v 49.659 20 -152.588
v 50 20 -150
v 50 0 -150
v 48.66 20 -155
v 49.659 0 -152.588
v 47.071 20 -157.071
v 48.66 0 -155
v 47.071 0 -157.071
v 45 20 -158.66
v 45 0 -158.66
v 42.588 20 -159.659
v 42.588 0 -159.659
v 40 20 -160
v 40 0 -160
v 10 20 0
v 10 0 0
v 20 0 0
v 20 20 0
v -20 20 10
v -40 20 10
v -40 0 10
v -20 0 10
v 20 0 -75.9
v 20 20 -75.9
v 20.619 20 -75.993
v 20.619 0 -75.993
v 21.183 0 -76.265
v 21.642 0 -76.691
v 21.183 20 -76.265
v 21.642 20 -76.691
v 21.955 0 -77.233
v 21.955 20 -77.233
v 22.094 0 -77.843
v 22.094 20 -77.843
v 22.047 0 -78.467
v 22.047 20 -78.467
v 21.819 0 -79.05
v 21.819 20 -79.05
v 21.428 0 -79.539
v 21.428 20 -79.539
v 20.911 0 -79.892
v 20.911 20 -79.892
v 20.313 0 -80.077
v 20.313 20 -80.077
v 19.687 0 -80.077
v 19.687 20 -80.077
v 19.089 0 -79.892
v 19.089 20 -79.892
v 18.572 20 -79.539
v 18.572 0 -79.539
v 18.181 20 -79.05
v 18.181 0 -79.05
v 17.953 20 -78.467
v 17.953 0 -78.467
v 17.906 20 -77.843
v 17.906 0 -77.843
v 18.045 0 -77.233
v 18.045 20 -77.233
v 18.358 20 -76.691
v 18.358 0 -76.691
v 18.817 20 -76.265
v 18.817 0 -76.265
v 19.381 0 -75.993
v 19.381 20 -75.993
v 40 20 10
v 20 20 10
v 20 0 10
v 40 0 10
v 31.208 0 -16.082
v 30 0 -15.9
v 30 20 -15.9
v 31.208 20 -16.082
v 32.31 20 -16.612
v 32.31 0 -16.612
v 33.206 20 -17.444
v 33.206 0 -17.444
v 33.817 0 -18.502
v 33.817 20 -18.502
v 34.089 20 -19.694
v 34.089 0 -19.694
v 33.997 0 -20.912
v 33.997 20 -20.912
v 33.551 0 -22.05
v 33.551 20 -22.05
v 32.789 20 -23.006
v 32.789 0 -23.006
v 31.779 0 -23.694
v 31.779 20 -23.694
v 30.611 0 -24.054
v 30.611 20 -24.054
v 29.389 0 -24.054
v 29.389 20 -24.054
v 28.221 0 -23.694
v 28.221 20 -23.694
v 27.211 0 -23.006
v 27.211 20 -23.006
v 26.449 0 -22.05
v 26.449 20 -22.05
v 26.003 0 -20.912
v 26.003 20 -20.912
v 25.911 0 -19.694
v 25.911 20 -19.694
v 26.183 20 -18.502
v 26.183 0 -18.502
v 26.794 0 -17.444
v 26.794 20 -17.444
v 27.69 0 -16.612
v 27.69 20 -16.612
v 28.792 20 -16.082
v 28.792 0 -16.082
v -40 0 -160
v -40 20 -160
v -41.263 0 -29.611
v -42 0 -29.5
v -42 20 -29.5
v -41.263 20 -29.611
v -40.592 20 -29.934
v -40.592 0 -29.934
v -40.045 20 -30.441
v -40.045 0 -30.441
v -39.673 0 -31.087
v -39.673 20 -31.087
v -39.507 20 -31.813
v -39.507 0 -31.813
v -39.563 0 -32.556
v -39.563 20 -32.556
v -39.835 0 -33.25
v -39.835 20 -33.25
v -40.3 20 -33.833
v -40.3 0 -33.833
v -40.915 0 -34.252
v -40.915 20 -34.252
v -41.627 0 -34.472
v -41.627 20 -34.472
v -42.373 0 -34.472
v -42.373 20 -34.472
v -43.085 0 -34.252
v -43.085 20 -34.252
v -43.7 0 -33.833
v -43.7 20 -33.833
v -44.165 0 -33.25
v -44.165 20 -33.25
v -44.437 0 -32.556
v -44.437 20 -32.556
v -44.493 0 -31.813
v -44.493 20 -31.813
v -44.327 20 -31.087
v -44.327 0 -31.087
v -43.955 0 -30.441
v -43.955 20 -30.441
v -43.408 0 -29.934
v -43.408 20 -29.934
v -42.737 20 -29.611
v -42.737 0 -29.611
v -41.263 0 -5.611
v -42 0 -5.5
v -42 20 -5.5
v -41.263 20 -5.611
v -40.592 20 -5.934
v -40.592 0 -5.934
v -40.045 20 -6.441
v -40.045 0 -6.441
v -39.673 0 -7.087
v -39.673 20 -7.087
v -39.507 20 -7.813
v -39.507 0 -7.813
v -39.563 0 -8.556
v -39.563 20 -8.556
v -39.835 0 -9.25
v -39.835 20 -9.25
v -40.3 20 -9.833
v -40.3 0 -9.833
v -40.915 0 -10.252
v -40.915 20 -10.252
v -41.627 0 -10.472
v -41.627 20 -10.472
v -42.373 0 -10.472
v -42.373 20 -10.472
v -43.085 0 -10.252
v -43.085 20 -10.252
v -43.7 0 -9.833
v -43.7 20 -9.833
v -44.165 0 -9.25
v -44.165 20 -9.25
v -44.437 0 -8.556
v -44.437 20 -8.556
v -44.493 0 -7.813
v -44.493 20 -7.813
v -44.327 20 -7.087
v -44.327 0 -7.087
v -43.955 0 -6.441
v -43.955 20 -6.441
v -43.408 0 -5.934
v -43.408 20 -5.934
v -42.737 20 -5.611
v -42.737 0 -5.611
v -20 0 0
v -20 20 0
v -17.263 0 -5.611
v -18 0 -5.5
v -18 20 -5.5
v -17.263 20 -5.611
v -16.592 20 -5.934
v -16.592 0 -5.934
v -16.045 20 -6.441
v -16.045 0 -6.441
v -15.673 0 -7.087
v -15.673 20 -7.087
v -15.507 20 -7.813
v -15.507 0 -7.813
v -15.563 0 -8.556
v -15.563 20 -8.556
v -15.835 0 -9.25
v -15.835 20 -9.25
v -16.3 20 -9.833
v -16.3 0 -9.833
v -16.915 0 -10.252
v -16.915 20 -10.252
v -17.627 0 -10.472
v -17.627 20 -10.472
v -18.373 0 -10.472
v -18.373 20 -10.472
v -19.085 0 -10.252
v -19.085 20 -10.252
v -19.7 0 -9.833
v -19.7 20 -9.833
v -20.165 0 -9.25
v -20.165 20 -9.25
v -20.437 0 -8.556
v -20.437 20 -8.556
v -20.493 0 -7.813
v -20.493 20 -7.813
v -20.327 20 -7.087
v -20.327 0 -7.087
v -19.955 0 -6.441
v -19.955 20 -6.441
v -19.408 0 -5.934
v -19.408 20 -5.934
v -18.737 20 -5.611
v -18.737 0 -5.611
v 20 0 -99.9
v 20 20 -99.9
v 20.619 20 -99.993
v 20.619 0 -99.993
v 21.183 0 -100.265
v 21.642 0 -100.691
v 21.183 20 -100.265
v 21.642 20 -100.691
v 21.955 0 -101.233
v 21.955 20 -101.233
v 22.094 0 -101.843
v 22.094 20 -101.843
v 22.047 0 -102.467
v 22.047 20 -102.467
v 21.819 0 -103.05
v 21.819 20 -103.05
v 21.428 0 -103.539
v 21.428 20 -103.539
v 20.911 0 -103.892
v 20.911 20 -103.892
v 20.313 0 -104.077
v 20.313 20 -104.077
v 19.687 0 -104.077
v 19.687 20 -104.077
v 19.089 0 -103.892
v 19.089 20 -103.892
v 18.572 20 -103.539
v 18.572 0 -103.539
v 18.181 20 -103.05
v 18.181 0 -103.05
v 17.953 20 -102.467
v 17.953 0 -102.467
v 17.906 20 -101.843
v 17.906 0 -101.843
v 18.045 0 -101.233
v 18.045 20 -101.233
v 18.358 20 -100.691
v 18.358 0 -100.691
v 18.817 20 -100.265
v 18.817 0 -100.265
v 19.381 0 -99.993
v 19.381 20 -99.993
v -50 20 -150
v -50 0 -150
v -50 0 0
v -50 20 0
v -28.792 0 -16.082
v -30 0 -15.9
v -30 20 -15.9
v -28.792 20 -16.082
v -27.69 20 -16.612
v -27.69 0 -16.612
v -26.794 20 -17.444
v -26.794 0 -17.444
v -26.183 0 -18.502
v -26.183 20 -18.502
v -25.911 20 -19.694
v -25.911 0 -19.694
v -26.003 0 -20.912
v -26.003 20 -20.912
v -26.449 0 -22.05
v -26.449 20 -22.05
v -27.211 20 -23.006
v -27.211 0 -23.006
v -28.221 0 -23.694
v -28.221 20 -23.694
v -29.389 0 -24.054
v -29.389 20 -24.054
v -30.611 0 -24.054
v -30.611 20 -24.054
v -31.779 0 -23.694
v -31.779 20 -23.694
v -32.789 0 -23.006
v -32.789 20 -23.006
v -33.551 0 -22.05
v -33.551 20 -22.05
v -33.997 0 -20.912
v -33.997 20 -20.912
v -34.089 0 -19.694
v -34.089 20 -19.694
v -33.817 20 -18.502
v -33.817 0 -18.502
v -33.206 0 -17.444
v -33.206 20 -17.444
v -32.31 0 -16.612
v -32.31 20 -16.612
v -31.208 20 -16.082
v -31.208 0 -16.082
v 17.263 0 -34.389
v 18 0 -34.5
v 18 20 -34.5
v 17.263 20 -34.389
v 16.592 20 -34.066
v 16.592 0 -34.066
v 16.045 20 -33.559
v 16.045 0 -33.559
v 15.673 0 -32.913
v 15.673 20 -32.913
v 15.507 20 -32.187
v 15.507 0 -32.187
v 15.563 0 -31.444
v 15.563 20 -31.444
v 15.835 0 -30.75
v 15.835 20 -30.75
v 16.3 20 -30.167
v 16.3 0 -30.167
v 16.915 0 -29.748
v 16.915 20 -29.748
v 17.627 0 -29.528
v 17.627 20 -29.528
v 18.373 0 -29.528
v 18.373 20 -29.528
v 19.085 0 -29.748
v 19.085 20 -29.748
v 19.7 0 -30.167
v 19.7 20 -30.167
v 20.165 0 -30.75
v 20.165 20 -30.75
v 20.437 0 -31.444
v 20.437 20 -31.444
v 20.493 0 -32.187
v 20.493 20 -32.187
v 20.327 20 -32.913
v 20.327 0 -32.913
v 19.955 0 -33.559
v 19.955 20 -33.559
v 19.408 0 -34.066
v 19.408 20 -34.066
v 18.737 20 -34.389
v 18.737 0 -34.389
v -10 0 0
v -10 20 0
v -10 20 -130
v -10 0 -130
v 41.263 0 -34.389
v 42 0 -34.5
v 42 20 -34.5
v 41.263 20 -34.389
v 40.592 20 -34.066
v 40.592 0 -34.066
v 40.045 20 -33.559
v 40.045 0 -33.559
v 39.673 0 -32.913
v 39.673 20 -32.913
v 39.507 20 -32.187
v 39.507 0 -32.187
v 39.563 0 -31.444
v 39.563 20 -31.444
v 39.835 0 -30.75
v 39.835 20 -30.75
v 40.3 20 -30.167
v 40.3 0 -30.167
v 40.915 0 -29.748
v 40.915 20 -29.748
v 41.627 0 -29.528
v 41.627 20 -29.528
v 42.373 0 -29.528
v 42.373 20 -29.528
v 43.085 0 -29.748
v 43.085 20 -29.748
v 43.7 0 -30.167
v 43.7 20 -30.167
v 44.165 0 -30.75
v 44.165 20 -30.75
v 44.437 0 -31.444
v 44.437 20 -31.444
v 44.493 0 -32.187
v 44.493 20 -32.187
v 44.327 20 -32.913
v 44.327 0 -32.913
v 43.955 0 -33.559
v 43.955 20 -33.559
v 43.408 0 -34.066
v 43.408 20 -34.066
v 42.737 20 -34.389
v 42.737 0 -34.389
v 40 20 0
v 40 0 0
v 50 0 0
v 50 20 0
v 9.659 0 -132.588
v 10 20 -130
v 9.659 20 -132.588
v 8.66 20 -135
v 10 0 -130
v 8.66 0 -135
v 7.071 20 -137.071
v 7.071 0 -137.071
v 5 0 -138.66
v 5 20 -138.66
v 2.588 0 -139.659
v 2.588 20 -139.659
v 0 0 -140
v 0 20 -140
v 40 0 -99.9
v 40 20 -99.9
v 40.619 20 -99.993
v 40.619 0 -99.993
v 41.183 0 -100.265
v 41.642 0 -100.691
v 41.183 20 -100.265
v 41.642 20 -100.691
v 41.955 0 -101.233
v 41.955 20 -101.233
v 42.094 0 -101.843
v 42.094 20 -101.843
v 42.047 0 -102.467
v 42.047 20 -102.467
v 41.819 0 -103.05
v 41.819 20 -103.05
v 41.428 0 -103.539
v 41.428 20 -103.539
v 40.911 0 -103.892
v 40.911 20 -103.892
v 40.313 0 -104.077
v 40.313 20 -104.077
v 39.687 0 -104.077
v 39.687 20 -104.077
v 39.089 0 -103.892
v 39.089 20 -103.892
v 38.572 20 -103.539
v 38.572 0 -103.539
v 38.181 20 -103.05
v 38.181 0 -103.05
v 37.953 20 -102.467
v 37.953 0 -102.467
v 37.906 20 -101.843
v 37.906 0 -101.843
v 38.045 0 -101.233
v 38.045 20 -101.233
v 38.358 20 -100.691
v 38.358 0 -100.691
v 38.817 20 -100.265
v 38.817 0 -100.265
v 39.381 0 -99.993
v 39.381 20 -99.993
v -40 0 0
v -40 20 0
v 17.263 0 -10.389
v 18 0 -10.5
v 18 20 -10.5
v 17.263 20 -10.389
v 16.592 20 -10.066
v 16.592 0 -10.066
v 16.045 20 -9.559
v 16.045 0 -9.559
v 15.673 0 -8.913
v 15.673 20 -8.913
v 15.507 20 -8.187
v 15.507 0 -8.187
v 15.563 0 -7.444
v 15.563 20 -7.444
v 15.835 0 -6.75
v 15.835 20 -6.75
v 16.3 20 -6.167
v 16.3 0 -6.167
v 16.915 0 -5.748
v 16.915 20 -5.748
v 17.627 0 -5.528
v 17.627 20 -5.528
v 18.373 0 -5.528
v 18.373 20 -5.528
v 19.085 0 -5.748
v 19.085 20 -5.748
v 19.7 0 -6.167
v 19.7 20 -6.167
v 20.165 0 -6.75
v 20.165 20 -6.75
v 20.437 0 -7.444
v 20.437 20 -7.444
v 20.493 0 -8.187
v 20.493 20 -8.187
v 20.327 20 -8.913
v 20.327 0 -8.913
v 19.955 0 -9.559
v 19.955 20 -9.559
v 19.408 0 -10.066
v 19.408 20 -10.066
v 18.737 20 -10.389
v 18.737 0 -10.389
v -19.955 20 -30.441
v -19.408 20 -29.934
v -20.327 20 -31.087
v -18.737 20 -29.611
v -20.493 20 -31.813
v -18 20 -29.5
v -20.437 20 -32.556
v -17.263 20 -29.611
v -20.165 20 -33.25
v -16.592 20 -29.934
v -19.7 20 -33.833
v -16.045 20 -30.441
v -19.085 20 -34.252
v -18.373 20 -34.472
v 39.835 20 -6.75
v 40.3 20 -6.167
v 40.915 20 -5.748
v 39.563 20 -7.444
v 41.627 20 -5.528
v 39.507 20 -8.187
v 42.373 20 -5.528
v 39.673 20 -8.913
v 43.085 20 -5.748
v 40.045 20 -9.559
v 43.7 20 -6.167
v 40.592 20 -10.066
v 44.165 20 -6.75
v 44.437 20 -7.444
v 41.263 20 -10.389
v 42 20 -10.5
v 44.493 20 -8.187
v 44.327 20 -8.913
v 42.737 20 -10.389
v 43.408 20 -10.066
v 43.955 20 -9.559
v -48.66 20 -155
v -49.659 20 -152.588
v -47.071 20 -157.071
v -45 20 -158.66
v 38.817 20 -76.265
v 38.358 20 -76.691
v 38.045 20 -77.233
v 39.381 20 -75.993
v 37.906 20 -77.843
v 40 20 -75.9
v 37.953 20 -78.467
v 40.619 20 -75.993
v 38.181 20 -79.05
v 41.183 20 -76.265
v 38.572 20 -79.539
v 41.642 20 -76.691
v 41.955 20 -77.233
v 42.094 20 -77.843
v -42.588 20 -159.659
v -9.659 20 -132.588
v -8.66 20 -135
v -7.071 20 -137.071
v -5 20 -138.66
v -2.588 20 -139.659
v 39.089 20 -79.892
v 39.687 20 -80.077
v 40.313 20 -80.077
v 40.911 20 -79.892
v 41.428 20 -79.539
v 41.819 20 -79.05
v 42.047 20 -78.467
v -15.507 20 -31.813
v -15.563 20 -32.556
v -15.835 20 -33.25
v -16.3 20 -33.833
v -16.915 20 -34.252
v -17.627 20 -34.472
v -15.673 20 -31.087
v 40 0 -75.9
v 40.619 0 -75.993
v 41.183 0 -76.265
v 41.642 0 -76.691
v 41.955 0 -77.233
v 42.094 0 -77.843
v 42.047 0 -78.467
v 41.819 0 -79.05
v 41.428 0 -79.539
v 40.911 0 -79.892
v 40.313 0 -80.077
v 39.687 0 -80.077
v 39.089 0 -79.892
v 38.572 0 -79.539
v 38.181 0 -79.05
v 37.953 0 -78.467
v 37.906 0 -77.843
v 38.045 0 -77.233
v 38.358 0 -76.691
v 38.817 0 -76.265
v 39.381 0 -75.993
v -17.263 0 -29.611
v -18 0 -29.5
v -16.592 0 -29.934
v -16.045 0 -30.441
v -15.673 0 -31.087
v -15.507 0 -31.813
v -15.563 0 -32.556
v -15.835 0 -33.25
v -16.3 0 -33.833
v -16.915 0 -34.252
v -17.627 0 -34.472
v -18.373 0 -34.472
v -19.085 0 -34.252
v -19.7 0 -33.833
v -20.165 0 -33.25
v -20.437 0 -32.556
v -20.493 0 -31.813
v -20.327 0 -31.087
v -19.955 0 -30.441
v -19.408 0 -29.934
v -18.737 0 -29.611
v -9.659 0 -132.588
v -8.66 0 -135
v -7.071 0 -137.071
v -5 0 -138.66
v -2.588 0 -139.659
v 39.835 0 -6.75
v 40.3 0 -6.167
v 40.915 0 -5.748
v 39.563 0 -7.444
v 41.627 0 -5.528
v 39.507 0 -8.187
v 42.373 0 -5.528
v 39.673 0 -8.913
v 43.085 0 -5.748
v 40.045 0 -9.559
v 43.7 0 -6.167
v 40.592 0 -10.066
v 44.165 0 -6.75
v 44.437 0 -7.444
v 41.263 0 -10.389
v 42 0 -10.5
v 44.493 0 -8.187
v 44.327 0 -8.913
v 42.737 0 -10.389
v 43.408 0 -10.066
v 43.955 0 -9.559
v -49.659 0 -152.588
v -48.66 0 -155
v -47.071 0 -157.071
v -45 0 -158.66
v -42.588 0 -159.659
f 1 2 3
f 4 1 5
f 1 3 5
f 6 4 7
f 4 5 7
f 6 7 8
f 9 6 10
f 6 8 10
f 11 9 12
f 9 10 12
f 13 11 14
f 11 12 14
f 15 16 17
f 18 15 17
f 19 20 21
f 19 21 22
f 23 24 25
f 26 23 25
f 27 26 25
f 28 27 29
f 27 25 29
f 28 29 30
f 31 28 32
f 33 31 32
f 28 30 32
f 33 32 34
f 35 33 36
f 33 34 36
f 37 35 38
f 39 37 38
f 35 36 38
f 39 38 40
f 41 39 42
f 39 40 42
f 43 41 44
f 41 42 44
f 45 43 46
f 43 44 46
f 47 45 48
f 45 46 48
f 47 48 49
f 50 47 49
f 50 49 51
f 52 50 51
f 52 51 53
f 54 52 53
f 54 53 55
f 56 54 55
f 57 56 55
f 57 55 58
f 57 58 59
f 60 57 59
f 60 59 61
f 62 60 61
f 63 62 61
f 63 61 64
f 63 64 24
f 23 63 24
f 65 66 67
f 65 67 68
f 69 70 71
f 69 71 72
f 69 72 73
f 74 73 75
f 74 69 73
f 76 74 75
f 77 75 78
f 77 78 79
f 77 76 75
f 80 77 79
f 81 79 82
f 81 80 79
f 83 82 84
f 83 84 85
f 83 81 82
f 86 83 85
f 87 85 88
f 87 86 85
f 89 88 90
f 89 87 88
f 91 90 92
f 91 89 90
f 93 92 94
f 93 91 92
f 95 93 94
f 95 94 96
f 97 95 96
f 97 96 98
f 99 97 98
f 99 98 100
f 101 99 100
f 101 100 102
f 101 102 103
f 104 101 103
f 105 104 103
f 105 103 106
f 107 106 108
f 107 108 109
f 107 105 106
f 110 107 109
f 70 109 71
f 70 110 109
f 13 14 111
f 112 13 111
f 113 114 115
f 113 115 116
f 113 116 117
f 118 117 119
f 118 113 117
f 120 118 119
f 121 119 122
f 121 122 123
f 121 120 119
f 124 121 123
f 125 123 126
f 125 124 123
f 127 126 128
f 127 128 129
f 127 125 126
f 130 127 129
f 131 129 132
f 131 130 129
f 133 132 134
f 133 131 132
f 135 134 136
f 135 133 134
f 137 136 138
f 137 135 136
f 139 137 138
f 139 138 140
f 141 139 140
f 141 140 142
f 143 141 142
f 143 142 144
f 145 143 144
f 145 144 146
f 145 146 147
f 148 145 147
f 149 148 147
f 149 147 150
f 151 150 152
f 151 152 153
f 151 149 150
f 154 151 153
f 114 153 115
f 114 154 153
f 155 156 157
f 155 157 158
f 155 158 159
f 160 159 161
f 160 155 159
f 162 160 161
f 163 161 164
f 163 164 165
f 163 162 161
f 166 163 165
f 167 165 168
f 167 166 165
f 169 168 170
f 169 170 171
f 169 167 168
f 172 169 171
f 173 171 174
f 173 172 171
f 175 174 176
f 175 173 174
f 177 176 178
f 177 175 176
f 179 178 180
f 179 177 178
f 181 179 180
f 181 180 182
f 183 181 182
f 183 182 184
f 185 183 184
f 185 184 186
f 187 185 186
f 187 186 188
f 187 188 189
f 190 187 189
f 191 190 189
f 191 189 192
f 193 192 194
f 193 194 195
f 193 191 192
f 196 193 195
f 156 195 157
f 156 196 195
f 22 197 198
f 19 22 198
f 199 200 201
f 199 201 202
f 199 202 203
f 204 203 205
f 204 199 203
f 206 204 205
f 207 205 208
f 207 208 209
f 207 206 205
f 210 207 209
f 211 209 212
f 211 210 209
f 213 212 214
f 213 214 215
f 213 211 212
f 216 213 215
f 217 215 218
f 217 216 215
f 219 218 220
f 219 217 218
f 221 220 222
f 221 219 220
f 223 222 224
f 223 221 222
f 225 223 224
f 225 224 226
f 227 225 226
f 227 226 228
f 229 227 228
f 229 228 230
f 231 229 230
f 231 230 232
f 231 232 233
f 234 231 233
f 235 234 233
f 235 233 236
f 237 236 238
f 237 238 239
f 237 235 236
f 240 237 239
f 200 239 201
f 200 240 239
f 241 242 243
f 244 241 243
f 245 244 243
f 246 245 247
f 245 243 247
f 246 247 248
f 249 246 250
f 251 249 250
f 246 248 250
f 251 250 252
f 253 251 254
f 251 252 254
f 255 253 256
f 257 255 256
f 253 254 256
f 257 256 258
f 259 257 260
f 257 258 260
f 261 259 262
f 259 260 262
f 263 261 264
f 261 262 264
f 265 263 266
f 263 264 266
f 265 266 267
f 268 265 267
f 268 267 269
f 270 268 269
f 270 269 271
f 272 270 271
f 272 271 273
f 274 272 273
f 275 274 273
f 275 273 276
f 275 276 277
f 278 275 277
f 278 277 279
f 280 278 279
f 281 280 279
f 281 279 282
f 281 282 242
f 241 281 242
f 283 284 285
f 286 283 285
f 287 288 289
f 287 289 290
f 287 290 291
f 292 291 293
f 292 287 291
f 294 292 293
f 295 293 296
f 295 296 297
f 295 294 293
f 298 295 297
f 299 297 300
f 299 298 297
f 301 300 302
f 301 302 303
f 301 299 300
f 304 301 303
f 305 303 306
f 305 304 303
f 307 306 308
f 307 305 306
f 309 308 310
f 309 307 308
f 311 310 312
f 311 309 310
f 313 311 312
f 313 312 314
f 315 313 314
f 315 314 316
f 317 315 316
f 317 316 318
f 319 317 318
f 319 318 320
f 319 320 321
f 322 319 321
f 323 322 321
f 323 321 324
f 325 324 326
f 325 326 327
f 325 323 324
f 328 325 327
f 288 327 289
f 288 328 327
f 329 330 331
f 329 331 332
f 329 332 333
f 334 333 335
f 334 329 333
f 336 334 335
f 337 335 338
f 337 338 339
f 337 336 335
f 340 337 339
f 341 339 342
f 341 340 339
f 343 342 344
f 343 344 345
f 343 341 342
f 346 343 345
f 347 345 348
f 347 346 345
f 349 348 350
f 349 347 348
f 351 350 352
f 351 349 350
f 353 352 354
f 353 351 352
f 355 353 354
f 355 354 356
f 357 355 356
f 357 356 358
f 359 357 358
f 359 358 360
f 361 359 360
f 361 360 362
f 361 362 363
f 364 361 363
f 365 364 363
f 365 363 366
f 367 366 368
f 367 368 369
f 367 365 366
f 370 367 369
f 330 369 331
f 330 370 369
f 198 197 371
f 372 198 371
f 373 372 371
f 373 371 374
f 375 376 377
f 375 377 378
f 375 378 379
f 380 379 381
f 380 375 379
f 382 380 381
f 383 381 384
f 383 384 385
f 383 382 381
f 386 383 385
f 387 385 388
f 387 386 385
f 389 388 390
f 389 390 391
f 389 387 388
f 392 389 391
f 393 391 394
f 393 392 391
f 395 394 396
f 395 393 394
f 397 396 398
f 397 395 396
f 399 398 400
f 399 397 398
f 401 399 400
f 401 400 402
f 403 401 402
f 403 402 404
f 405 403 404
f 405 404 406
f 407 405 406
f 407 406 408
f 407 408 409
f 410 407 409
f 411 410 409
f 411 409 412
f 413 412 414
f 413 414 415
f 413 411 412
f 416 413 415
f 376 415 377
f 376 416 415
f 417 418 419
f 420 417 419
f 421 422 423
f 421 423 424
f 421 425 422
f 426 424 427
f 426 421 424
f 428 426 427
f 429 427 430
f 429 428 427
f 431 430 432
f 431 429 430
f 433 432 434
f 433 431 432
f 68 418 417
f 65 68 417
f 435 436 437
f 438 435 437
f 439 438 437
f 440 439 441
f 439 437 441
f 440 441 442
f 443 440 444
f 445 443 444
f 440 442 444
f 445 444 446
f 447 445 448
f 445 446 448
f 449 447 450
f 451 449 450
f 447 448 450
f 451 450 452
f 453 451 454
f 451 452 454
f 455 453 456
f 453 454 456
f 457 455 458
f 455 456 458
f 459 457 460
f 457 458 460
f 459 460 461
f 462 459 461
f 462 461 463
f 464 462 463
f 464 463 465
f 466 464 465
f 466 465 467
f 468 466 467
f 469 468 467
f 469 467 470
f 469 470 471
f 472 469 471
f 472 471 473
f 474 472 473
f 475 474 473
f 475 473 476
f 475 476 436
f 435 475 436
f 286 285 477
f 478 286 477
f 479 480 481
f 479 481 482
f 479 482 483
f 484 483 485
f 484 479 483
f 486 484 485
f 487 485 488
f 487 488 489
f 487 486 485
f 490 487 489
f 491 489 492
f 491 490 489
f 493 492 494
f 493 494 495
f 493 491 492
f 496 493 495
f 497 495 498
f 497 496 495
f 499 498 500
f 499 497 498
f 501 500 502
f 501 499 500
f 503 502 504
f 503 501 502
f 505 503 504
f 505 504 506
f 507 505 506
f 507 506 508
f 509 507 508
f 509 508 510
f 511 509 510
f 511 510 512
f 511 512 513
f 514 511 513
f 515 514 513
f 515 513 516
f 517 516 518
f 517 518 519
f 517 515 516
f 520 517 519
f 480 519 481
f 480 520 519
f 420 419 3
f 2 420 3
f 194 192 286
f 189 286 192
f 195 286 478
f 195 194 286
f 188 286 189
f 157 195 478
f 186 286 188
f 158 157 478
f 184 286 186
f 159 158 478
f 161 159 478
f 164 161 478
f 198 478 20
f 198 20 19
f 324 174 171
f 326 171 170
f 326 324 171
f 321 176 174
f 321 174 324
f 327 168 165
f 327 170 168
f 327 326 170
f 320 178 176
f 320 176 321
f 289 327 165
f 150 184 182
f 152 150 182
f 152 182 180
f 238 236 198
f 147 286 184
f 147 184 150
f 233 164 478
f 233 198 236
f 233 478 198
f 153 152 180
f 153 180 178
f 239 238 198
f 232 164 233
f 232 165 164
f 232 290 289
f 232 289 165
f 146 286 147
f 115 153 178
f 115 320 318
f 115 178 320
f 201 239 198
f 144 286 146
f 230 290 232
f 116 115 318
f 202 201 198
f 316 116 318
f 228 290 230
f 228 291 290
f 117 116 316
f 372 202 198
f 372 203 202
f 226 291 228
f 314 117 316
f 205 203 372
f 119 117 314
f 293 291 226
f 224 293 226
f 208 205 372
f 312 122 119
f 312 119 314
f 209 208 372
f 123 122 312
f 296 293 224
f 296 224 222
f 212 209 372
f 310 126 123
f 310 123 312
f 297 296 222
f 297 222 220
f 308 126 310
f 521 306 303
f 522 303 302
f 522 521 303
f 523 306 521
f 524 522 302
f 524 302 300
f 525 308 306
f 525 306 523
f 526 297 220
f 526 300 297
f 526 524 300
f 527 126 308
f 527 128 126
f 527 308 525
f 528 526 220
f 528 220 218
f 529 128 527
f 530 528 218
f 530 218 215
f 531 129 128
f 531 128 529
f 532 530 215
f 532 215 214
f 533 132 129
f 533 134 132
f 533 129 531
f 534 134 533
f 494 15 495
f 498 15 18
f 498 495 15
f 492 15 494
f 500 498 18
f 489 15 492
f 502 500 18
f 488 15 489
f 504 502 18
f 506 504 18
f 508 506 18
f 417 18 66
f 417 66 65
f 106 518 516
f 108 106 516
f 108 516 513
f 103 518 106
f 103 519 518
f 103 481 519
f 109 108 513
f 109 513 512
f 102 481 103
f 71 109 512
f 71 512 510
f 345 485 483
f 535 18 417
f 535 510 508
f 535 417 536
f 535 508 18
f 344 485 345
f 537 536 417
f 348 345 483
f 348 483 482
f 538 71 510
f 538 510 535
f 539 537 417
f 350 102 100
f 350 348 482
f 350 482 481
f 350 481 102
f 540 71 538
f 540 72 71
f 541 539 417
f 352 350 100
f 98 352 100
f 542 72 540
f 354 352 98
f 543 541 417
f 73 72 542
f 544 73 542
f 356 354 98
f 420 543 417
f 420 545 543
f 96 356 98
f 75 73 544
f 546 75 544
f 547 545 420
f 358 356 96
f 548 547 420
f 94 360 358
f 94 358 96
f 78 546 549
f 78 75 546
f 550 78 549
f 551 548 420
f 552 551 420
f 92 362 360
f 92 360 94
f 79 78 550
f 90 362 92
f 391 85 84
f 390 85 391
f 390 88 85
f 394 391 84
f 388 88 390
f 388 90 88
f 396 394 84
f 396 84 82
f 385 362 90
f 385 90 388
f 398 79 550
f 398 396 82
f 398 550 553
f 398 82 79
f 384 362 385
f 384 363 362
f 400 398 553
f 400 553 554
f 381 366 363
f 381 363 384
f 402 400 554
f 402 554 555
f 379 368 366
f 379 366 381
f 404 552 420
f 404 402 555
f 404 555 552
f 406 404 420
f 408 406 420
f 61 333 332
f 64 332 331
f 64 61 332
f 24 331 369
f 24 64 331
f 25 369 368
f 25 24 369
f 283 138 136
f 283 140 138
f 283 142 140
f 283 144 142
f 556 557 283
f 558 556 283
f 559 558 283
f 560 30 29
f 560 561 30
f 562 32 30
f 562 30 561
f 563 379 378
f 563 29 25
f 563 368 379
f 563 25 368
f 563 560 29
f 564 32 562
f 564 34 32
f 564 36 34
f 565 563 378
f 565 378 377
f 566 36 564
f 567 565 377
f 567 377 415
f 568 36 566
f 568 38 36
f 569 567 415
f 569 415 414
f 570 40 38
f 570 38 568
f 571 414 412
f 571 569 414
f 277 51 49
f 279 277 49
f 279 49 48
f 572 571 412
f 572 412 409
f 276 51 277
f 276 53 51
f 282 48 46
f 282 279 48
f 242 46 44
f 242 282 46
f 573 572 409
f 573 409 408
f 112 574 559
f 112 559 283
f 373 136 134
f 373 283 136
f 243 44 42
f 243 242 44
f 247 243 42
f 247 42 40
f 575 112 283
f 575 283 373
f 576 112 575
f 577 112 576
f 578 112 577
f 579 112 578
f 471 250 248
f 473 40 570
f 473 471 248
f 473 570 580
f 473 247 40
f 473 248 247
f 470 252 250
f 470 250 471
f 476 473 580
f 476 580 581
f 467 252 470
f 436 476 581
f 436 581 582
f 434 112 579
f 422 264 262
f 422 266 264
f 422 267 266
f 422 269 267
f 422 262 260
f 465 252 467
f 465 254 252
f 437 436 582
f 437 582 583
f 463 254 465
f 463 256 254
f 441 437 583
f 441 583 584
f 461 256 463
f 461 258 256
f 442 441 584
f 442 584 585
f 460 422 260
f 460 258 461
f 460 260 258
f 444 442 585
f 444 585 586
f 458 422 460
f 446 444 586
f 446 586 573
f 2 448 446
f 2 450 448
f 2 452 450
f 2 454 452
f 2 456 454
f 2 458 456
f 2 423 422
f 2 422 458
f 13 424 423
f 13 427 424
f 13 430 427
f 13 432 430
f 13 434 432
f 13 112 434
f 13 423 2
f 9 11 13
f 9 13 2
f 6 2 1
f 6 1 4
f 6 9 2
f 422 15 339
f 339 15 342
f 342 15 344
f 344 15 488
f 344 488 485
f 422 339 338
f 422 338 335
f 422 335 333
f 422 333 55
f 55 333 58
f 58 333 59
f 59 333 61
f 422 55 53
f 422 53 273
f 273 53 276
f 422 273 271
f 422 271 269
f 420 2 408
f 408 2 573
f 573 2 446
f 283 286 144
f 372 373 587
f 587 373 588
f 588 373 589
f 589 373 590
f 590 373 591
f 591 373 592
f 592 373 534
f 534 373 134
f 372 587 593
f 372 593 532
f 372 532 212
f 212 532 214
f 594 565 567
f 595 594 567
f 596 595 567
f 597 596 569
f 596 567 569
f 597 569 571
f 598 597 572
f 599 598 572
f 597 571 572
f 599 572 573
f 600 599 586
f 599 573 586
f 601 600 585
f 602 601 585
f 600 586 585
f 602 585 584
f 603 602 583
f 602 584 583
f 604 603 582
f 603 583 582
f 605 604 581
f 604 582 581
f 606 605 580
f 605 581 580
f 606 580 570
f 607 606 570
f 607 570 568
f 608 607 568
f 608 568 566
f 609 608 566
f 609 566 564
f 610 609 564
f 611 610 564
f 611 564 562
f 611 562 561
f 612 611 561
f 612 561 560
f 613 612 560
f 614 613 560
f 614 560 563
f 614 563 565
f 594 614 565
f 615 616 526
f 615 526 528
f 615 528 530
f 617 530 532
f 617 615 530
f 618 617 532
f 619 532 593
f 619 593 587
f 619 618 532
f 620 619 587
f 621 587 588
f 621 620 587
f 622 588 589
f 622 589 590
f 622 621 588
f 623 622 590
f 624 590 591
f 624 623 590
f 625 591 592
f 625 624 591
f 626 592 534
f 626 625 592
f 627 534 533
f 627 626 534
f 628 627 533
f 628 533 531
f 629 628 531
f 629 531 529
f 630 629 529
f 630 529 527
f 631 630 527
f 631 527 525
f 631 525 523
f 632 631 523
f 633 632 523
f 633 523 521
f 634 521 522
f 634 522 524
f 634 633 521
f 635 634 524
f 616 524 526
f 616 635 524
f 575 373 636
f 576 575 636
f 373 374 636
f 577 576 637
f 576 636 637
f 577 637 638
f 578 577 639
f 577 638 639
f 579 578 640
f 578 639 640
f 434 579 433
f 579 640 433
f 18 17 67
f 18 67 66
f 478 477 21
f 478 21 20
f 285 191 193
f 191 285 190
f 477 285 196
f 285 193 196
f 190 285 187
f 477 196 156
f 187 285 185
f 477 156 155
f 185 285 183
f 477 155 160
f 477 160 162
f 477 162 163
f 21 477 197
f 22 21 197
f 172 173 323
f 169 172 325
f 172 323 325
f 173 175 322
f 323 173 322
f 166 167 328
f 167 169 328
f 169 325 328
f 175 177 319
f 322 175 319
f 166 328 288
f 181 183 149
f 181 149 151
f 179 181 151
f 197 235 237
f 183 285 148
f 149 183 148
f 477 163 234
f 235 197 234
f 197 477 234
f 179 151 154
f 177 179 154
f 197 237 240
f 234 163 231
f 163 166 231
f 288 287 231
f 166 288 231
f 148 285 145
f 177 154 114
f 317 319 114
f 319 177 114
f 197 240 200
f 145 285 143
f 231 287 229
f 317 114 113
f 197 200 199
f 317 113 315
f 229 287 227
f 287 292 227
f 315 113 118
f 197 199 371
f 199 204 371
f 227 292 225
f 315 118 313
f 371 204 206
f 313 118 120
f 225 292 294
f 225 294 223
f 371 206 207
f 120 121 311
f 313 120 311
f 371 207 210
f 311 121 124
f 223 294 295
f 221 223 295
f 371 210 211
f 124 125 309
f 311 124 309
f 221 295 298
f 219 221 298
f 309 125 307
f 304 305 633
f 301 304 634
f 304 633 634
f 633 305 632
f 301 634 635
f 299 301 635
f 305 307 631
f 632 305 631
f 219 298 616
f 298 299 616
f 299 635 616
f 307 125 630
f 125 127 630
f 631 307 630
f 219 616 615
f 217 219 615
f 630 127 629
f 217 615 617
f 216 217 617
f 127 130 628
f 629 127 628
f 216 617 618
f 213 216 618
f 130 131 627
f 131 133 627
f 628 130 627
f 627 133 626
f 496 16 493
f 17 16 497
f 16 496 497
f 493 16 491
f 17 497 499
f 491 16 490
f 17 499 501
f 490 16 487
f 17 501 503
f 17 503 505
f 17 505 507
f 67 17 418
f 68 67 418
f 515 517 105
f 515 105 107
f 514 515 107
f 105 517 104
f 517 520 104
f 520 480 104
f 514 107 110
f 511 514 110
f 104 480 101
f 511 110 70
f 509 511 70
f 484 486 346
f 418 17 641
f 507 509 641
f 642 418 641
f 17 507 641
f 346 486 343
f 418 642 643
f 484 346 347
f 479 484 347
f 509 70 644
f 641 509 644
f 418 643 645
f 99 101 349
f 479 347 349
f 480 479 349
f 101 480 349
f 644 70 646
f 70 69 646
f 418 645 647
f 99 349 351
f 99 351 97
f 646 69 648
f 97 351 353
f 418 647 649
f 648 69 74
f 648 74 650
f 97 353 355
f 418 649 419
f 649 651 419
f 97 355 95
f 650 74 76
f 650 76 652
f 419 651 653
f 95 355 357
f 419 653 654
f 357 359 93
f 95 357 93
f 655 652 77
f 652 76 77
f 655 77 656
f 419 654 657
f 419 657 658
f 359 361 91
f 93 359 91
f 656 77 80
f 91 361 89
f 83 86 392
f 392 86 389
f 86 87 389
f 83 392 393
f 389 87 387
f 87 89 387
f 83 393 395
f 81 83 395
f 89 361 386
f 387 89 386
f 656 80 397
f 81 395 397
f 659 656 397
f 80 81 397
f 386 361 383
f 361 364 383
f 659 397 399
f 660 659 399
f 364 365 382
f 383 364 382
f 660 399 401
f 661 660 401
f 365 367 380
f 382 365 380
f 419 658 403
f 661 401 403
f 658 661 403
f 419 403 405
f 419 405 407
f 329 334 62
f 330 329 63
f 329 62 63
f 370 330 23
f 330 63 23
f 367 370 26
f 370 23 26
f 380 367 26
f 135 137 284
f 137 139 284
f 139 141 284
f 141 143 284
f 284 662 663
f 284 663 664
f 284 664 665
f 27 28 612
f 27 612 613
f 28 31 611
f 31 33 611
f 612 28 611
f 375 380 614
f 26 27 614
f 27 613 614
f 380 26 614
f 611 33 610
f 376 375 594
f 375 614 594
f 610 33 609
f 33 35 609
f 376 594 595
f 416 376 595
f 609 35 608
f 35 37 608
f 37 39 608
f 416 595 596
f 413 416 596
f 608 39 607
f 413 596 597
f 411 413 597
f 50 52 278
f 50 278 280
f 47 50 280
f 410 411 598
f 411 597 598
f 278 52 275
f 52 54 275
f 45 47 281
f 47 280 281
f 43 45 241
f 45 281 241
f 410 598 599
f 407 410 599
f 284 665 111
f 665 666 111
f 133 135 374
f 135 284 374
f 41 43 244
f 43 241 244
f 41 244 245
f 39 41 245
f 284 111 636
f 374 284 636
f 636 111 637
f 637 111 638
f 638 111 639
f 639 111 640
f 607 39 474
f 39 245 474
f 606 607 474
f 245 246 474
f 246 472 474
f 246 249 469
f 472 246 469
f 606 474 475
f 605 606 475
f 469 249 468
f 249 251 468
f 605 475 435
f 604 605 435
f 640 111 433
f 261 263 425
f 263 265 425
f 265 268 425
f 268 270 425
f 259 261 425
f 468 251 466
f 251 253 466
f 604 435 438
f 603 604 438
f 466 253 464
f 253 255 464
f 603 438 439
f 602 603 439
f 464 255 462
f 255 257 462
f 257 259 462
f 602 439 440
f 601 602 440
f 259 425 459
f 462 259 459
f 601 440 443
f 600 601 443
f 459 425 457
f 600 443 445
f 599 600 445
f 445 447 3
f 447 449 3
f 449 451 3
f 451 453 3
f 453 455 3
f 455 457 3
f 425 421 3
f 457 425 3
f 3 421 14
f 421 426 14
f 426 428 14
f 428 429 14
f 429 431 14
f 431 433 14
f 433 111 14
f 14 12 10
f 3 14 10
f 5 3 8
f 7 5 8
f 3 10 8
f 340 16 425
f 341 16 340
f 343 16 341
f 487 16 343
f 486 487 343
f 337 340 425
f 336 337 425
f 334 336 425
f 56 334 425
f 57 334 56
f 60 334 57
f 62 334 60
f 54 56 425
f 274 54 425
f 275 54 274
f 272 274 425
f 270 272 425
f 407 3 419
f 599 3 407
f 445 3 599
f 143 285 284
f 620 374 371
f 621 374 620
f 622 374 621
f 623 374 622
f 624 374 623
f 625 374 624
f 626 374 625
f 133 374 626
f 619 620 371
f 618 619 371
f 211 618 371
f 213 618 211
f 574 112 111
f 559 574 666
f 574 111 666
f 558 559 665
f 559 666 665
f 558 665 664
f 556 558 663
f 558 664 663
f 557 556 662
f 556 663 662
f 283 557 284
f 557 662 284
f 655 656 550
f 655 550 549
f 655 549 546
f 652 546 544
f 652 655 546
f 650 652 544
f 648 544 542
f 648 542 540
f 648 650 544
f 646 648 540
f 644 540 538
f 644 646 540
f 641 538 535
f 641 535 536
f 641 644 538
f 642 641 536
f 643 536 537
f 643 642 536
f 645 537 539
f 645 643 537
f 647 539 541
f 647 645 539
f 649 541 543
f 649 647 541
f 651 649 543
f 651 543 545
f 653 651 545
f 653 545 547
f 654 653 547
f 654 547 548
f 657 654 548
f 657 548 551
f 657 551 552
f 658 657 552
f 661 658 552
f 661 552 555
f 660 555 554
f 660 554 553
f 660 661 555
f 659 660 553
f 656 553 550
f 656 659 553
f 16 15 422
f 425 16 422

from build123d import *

# Parameters (mm, degrees)
SKETCH_1_R          = 4.1
SKETCH_1_R_2        = 2.5
EXTRUDE_1_DEPTH     = 20
SKETCH_2_W          = 20
SKETCH_2_H          = 140
CUT_EXTRUDE_1_DEPTH = 169.819430161
FILLET_1_R          = 10
SKETCH_3_W          = 20
SKETCH_3_H          = 20
EXTRUDE_2_DEPTH     = 10
SKETCH_4_W          = 20
SKETCH_4_H          = 20
EXTRUDE_3_DEPTH     = 10
SKETCH_5_R          = 2.1
CUT_EXTRUDE_2_DEPTH = 169.819430161


with BuildPart() as part:
    # ｽｹｯﾁ1 → ﾎﾞｽ - 押し出し1 (new body)
    with BuildSketch(Plane(origin=(0, 0, 0), x_dir=(1, 0, 0), z_dir=(0, 1, 0))):
        with BuildLine():
            Line((-50, 0), (50, 0))
            Line((50, 0), (50, 150))
            ThreePointArc((50, 150), (47.071067812, 157.071067812), (40, 160))
            Line((40, 160), (-40, 160))
            ThreePointArc((-40, 160), (-47.071067812, 157.071067812), (-50, 150))
            Line((-50, 150), (-50, 0))
        make_face()
        with Locations(Location((-30, 20, 0), (0, 0, 270))):
            Circle(SKETCH_1_R, mode=Mode.SUBTRACT)
        with Locations(Location((30, 20, 0), (0, 0, 270))):
            Circle(SKETCH_1_R, mode=Mode.SUBTRACT)
        with Locations(Location((-42, 32, 0), (0, 0, 270))):
            Circle(SKETCH_1_R_2, mode=Mode.SUBTRACT)
        with Locations(Location((-18, 32, 0), (0, 0, 270))):
            Circle(SKETCH_1_R_2, mode=Mode.SUBTRACT)
        with Locations(Location((-18, 8, 0), (0, 0, 270))):
            Circle(SKETCH_1_R_2, mode=Mode.SUBTRACT)
        with Locations(Location((-42, 8, 0), (0, 0, 270))):
            Circle(SKETCH_1_R_2, mode=Mode.SUBTRACT)
        with Locations(Location((18, 32, 0), (0, 0, 90))):
            Circle(SKETCH_1_R_2, mode=Mode.SUBTRACT)
        with Locations(Location((18, 8, 0), (0, 0, 90))):
            Circle(SKETCH_1_R_2, mode=Mode.SUBTRACT)
        with Locations(Location((42, 8, 0), (0, 0, 90))):
            Circle(SKETCH_1_R_2, mode=Mode.SUBTRACT)
        with Locations(Location((42, 32, 0), (0, 0, 90))):
            Circle(SKETCH_1_R_2, mode=Mode.SUBTRACT)
    extrude(amount=EXTRUDE_1_DEPTH)

    # ｽｹｯﾁ2 → ｶｯﾄ - 押し出し1 (cut, through all)
    with BuildSketch(Plane(origin=(0, 20, 0), x_dir=(1, 0, 0), z_dir=(0, 1, 0))):
        with Locations((0, 70)):
            Rectangle(SKETCH_2_W, SKETCH_2_H)
    extrude(amount=-CUT_EXTRUDE_1_DEPTH, mode=Mode.SUBTRACT)

    # ﾌｨﾚｯﾄ1
    fillet_1_edges = [part.edges().sort_by_distance(p)[0] for p in [
        (-10, 10, -140),
        (10, 10, -140),
    ]]
    fillet(fillet_1_edges, radius=FILLET_1_R - 0.0001)  # a hair under: the kernel refuses the full size

    # ｽｹｯﾁ3 → ﾎﾞｽ - 押し出し2 (add)
    with BuildSketch(Plane.XY):
        with Locations((30, 10)):
            Rectangle(SKETCH_3_W, SKETCH_3_H)
    extrude(amount=EXTRUDE_2_DEPTH)

    # ｽｹｯﾁ4 → ﾎﾞｽ - 押し出し3 (add)
    with BuildSketch(Plane.XY):
        with Locations((-30, 10)):
            Rectangle(SKETCH_4_W, SKETCH_4_H)
    extrude(amount=EXTRUDE_3_DEPTH)

    # ｽｹｯﾁ5 → ｶｯﾄ - 押し出し2 (cut, through all)
    with BuildSketch(Plane(origin=(0, 20, 0), x_dir=(1, 0, 0), z_dir=(0, 1, 0))):
        with Locations(Location((20, 102, 0), (0, 0, 270))):
            Circle(SKETCH_5_R)
        with Locations(Location((40, 102, 0), (0, 0, 270))):
            Circle(SKETCH_5_R)
        with Locations(Location((20, 78, 0), (0, 0, 270))):
            Circle(SKETCH_5_R)
        with Locations(Location((40, 78, 0), (0, 0, 270))):
            Circle(SKETCH_5_R)
    extrude(amount=-CUT_EXTRUDE_2_DEPTH, mode=Mode.SUBTRACT)


solid = part.part
